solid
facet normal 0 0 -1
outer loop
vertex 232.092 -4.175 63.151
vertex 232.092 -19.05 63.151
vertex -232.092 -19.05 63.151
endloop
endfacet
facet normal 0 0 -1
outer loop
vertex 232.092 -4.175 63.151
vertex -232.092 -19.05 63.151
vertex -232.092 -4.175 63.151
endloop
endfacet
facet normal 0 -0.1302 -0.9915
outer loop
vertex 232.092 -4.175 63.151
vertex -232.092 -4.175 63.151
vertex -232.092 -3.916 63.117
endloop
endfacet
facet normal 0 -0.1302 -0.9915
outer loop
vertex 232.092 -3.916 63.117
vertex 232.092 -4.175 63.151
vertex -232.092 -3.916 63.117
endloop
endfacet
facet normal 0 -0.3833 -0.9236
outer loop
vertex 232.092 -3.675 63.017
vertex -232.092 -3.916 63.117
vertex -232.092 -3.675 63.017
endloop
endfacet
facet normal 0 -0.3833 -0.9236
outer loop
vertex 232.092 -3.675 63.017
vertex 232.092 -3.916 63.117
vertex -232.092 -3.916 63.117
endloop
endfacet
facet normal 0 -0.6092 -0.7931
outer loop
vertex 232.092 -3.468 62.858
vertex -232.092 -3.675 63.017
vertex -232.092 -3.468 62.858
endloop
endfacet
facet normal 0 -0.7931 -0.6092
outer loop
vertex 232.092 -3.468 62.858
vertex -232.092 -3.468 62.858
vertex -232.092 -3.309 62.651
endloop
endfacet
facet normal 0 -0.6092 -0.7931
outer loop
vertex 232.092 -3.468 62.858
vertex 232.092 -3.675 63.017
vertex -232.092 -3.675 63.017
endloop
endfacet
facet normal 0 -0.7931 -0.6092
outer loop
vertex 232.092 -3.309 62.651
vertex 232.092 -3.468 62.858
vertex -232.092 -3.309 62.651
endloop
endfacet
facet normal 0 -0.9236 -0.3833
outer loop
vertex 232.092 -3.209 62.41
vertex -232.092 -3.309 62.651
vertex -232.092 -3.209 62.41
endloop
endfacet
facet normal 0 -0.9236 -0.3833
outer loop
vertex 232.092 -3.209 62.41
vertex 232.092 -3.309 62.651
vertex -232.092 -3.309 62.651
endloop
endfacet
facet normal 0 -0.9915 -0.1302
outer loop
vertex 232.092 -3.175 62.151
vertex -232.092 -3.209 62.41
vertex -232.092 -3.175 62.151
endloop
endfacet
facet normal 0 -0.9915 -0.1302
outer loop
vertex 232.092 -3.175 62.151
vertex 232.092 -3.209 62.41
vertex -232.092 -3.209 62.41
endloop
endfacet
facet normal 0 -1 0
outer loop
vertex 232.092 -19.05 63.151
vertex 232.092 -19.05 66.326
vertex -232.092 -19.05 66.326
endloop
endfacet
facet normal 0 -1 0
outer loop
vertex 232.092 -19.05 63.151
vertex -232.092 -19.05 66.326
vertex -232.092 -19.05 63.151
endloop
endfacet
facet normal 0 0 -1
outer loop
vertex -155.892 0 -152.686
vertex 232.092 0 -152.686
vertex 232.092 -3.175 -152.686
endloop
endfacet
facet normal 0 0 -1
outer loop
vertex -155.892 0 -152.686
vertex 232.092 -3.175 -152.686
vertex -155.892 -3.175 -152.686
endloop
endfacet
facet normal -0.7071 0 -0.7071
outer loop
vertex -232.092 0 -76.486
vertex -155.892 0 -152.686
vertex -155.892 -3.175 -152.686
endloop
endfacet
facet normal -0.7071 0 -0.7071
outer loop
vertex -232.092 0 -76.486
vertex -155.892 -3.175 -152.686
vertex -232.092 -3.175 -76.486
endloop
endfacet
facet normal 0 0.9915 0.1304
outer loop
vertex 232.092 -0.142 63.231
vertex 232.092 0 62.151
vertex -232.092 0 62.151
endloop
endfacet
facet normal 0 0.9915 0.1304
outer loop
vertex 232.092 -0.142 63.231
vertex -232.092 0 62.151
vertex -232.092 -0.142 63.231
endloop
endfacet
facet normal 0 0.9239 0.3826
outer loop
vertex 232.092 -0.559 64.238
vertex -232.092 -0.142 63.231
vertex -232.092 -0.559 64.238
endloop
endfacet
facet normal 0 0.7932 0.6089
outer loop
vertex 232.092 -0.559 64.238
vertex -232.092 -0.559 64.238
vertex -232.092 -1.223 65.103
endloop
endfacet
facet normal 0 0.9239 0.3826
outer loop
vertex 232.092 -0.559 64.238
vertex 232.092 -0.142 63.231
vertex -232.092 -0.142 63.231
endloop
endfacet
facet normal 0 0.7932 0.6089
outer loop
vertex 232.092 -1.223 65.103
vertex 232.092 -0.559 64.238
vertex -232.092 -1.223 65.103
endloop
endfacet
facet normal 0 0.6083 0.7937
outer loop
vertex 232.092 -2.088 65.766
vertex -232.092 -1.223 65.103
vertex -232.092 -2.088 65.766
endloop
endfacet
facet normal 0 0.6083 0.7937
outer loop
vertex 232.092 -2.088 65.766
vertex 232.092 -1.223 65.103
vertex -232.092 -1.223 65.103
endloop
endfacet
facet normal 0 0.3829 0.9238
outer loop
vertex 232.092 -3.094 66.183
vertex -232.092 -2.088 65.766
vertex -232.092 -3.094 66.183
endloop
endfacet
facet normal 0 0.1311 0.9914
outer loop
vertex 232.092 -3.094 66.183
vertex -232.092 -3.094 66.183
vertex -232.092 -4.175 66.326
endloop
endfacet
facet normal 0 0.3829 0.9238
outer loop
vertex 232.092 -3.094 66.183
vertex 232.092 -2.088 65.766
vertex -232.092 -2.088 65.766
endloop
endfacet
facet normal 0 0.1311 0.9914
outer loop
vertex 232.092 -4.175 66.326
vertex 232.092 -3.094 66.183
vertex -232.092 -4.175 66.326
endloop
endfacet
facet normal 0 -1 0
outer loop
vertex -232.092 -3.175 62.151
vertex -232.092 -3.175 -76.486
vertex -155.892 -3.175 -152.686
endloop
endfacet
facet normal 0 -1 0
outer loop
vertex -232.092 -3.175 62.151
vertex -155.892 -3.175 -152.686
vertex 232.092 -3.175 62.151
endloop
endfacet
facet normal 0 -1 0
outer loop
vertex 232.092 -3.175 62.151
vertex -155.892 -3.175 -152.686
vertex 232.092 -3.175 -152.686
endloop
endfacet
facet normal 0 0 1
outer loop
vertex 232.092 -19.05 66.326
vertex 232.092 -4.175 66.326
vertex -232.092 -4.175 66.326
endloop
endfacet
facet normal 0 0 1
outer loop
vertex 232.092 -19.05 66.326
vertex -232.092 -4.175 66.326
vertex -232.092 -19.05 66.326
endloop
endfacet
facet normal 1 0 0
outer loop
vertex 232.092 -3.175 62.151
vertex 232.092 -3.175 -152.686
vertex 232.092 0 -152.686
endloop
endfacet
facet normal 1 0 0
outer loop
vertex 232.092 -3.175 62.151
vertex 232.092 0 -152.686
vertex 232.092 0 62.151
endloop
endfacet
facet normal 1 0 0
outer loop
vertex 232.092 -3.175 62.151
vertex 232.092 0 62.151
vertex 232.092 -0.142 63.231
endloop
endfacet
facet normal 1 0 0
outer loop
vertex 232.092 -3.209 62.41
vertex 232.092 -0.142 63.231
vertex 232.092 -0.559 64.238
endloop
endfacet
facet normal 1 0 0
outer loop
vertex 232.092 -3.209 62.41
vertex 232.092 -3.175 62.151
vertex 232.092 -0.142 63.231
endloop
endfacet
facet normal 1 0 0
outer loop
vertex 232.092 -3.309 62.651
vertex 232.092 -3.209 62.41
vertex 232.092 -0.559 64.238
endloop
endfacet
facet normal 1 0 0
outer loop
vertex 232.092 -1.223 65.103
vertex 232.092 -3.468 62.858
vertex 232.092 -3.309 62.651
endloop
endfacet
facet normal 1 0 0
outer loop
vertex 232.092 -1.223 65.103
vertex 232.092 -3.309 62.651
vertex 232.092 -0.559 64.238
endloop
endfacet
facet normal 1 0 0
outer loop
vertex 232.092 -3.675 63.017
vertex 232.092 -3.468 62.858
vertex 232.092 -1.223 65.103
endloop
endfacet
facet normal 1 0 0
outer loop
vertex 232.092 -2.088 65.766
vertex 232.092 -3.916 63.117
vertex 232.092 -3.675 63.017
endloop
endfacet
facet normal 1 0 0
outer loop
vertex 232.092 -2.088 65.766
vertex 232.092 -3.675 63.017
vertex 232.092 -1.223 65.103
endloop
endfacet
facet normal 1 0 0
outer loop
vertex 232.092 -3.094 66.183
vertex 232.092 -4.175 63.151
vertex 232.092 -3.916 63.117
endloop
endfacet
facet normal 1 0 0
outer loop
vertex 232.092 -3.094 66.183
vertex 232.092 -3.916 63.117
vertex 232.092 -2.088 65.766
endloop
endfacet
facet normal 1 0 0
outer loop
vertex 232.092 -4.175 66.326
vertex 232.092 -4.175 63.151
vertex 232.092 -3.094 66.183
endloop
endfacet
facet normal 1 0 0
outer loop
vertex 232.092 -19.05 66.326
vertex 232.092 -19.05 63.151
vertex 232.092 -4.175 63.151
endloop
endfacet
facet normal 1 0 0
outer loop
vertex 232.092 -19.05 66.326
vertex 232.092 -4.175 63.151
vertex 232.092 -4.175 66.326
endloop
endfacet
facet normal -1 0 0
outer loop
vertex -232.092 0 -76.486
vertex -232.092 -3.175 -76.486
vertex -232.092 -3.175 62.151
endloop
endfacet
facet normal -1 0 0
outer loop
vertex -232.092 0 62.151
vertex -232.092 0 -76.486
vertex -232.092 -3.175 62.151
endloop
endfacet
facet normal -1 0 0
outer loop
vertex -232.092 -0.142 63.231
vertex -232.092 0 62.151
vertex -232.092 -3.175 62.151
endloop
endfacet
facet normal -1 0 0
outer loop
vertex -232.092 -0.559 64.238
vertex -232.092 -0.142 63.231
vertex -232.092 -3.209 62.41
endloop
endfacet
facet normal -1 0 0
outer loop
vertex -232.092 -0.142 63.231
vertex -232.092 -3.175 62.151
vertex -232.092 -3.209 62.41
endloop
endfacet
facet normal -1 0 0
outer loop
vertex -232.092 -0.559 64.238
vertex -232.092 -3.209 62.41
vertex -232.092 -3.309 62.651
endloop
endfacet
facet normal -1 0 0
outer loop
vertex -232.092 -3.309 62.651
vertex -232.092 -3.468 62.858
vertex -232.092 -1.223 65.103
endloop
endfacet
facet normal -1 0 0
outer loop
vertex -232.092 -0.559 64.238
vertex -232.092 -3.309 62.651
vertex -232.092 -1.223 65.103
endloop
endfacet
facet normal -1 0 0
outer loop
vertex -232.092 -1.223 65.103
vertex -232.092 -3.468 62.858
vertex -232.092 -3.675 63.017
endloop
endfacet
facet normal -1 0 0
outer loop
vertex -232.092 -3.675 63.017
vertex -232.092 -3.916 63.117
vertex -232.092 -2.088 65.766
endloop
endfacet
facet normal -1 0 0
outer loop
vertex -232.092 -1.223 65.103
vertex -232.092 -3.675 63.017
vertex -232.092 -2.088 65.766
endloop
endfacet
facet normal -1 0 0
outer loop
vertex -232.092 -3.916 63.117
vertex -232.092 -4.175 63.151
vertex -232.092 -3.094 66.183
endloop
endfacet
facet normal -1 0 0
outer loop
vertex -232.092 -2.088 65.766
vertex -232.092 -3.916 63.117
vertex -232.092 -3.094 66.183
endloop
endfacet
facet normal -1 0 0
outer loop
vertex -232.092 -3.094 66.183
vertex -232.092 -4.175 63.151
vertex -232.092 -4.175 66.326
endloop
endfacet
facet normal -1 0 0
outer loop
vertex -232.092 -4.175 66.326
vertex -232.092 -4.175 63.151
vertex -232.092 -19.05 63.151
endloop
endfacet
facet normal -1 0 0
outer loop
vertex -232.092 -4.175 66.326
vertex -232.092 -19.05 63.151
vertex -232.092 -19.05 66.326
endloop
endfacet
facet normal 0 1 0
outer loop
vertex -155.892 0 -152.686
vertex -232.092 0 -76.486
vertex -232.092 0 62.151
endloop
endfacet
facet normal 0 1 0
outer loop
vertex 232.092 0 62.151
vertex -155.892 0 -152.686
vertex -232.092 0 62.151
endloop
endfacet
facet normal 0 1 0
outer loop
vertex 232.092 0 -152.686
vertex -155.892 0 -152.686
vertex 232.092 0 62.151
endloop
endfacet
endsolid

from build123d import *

# Parameters (mm, degrees)
SKETCH2_W                    = 464.185
SKETCH2_H                    = 127.5715
BASE_FLANGE1_DEPTH           = 3.175
BOSS_EXTRUDE1_DEPTH          = 3.175
EDGE_FLANGE1_STRIP_W         = 17.24
EDGE_FLANGE1_STRIP_H         = 3.175
EDGE_FLANGE1_STRIP_CUT_DEPTH = 464.185
EDGE_FLANGE1_DEPTH           = 464.185


# Sheet-metal steps are written as plain solids
with BuildPart() as part:
    # Sketch2 → Base-Flange1 (new body)
    with BuildSketch(Plane(origin=(0, 0, 0), x_dir=(1, 0, 0), z_dir=(0, 1, 0))):
        Rectangle(SKETCH2_W, SKETCH2_H)
    extrude(amount=-BASE_FLANGE1_DEPTH)

    # Sketch7 → Boss-Extrude1 (add)
    with BuildSketch(Plane(origin=(0, 0, 0), x_dir=(1, 0, 0), z_dir=(0, 1, 0))):
        Polygon((-232.0925, 63.78575), (232.0925, 63.78575), (232.0925, 152.68575), (-155.8925, 152.68575), (-232.0925, 76.48575), align=None)
    extrude(amount=-BOSS_EXTRUDE1_DEPTH)

    # Edge-Flange1 strip (across the edge) → Edge-Flange1 strip cut (cut)
    with BuildSketch(Plane(origin=(232.0925, -3.175, 66.32575), x_dir=(0, 0, -1), z_dir=(-1, 0, 0))):
        with Locations((-4.445, -1.5875)):
            Rectangle(EDGE_FLANGE1_STRIP_W, EDGE_FLANGE1_STRIP_H)
    extrude(amount=EDGE_FLANGE1_STRIP_CUT_DEPTH, mode=Mode.SUBTRACT)

    # Edge-Flange1 section (across the edge) → Edge-Flange1 (add)
    with BuildSketch(Plane(origin=(232.0925, -3.175, 66.32575), x_dir=(0, 0, -1), z_dir=(-1, 0, 0))):
        with BuildLine():
            Line((0, 1), (0, 15.875))
            Line((0, 15.875), (3.175, 15.875))
            Line((3.175, 15.875), (3.175, 1))
            ThreePointArc((3.175, 1), (3.467893219, 0.292893219), (4.175, 0))
            Line((4.175, 0), (4.175, -3.175))
            ThreePointArc((4.175, -3.175), (1.222829189, -1.952170811), (0, 1))
        make_face()
    extrude(amount=EDGE_FLANGE1_DEPTH)


solid = part.part
